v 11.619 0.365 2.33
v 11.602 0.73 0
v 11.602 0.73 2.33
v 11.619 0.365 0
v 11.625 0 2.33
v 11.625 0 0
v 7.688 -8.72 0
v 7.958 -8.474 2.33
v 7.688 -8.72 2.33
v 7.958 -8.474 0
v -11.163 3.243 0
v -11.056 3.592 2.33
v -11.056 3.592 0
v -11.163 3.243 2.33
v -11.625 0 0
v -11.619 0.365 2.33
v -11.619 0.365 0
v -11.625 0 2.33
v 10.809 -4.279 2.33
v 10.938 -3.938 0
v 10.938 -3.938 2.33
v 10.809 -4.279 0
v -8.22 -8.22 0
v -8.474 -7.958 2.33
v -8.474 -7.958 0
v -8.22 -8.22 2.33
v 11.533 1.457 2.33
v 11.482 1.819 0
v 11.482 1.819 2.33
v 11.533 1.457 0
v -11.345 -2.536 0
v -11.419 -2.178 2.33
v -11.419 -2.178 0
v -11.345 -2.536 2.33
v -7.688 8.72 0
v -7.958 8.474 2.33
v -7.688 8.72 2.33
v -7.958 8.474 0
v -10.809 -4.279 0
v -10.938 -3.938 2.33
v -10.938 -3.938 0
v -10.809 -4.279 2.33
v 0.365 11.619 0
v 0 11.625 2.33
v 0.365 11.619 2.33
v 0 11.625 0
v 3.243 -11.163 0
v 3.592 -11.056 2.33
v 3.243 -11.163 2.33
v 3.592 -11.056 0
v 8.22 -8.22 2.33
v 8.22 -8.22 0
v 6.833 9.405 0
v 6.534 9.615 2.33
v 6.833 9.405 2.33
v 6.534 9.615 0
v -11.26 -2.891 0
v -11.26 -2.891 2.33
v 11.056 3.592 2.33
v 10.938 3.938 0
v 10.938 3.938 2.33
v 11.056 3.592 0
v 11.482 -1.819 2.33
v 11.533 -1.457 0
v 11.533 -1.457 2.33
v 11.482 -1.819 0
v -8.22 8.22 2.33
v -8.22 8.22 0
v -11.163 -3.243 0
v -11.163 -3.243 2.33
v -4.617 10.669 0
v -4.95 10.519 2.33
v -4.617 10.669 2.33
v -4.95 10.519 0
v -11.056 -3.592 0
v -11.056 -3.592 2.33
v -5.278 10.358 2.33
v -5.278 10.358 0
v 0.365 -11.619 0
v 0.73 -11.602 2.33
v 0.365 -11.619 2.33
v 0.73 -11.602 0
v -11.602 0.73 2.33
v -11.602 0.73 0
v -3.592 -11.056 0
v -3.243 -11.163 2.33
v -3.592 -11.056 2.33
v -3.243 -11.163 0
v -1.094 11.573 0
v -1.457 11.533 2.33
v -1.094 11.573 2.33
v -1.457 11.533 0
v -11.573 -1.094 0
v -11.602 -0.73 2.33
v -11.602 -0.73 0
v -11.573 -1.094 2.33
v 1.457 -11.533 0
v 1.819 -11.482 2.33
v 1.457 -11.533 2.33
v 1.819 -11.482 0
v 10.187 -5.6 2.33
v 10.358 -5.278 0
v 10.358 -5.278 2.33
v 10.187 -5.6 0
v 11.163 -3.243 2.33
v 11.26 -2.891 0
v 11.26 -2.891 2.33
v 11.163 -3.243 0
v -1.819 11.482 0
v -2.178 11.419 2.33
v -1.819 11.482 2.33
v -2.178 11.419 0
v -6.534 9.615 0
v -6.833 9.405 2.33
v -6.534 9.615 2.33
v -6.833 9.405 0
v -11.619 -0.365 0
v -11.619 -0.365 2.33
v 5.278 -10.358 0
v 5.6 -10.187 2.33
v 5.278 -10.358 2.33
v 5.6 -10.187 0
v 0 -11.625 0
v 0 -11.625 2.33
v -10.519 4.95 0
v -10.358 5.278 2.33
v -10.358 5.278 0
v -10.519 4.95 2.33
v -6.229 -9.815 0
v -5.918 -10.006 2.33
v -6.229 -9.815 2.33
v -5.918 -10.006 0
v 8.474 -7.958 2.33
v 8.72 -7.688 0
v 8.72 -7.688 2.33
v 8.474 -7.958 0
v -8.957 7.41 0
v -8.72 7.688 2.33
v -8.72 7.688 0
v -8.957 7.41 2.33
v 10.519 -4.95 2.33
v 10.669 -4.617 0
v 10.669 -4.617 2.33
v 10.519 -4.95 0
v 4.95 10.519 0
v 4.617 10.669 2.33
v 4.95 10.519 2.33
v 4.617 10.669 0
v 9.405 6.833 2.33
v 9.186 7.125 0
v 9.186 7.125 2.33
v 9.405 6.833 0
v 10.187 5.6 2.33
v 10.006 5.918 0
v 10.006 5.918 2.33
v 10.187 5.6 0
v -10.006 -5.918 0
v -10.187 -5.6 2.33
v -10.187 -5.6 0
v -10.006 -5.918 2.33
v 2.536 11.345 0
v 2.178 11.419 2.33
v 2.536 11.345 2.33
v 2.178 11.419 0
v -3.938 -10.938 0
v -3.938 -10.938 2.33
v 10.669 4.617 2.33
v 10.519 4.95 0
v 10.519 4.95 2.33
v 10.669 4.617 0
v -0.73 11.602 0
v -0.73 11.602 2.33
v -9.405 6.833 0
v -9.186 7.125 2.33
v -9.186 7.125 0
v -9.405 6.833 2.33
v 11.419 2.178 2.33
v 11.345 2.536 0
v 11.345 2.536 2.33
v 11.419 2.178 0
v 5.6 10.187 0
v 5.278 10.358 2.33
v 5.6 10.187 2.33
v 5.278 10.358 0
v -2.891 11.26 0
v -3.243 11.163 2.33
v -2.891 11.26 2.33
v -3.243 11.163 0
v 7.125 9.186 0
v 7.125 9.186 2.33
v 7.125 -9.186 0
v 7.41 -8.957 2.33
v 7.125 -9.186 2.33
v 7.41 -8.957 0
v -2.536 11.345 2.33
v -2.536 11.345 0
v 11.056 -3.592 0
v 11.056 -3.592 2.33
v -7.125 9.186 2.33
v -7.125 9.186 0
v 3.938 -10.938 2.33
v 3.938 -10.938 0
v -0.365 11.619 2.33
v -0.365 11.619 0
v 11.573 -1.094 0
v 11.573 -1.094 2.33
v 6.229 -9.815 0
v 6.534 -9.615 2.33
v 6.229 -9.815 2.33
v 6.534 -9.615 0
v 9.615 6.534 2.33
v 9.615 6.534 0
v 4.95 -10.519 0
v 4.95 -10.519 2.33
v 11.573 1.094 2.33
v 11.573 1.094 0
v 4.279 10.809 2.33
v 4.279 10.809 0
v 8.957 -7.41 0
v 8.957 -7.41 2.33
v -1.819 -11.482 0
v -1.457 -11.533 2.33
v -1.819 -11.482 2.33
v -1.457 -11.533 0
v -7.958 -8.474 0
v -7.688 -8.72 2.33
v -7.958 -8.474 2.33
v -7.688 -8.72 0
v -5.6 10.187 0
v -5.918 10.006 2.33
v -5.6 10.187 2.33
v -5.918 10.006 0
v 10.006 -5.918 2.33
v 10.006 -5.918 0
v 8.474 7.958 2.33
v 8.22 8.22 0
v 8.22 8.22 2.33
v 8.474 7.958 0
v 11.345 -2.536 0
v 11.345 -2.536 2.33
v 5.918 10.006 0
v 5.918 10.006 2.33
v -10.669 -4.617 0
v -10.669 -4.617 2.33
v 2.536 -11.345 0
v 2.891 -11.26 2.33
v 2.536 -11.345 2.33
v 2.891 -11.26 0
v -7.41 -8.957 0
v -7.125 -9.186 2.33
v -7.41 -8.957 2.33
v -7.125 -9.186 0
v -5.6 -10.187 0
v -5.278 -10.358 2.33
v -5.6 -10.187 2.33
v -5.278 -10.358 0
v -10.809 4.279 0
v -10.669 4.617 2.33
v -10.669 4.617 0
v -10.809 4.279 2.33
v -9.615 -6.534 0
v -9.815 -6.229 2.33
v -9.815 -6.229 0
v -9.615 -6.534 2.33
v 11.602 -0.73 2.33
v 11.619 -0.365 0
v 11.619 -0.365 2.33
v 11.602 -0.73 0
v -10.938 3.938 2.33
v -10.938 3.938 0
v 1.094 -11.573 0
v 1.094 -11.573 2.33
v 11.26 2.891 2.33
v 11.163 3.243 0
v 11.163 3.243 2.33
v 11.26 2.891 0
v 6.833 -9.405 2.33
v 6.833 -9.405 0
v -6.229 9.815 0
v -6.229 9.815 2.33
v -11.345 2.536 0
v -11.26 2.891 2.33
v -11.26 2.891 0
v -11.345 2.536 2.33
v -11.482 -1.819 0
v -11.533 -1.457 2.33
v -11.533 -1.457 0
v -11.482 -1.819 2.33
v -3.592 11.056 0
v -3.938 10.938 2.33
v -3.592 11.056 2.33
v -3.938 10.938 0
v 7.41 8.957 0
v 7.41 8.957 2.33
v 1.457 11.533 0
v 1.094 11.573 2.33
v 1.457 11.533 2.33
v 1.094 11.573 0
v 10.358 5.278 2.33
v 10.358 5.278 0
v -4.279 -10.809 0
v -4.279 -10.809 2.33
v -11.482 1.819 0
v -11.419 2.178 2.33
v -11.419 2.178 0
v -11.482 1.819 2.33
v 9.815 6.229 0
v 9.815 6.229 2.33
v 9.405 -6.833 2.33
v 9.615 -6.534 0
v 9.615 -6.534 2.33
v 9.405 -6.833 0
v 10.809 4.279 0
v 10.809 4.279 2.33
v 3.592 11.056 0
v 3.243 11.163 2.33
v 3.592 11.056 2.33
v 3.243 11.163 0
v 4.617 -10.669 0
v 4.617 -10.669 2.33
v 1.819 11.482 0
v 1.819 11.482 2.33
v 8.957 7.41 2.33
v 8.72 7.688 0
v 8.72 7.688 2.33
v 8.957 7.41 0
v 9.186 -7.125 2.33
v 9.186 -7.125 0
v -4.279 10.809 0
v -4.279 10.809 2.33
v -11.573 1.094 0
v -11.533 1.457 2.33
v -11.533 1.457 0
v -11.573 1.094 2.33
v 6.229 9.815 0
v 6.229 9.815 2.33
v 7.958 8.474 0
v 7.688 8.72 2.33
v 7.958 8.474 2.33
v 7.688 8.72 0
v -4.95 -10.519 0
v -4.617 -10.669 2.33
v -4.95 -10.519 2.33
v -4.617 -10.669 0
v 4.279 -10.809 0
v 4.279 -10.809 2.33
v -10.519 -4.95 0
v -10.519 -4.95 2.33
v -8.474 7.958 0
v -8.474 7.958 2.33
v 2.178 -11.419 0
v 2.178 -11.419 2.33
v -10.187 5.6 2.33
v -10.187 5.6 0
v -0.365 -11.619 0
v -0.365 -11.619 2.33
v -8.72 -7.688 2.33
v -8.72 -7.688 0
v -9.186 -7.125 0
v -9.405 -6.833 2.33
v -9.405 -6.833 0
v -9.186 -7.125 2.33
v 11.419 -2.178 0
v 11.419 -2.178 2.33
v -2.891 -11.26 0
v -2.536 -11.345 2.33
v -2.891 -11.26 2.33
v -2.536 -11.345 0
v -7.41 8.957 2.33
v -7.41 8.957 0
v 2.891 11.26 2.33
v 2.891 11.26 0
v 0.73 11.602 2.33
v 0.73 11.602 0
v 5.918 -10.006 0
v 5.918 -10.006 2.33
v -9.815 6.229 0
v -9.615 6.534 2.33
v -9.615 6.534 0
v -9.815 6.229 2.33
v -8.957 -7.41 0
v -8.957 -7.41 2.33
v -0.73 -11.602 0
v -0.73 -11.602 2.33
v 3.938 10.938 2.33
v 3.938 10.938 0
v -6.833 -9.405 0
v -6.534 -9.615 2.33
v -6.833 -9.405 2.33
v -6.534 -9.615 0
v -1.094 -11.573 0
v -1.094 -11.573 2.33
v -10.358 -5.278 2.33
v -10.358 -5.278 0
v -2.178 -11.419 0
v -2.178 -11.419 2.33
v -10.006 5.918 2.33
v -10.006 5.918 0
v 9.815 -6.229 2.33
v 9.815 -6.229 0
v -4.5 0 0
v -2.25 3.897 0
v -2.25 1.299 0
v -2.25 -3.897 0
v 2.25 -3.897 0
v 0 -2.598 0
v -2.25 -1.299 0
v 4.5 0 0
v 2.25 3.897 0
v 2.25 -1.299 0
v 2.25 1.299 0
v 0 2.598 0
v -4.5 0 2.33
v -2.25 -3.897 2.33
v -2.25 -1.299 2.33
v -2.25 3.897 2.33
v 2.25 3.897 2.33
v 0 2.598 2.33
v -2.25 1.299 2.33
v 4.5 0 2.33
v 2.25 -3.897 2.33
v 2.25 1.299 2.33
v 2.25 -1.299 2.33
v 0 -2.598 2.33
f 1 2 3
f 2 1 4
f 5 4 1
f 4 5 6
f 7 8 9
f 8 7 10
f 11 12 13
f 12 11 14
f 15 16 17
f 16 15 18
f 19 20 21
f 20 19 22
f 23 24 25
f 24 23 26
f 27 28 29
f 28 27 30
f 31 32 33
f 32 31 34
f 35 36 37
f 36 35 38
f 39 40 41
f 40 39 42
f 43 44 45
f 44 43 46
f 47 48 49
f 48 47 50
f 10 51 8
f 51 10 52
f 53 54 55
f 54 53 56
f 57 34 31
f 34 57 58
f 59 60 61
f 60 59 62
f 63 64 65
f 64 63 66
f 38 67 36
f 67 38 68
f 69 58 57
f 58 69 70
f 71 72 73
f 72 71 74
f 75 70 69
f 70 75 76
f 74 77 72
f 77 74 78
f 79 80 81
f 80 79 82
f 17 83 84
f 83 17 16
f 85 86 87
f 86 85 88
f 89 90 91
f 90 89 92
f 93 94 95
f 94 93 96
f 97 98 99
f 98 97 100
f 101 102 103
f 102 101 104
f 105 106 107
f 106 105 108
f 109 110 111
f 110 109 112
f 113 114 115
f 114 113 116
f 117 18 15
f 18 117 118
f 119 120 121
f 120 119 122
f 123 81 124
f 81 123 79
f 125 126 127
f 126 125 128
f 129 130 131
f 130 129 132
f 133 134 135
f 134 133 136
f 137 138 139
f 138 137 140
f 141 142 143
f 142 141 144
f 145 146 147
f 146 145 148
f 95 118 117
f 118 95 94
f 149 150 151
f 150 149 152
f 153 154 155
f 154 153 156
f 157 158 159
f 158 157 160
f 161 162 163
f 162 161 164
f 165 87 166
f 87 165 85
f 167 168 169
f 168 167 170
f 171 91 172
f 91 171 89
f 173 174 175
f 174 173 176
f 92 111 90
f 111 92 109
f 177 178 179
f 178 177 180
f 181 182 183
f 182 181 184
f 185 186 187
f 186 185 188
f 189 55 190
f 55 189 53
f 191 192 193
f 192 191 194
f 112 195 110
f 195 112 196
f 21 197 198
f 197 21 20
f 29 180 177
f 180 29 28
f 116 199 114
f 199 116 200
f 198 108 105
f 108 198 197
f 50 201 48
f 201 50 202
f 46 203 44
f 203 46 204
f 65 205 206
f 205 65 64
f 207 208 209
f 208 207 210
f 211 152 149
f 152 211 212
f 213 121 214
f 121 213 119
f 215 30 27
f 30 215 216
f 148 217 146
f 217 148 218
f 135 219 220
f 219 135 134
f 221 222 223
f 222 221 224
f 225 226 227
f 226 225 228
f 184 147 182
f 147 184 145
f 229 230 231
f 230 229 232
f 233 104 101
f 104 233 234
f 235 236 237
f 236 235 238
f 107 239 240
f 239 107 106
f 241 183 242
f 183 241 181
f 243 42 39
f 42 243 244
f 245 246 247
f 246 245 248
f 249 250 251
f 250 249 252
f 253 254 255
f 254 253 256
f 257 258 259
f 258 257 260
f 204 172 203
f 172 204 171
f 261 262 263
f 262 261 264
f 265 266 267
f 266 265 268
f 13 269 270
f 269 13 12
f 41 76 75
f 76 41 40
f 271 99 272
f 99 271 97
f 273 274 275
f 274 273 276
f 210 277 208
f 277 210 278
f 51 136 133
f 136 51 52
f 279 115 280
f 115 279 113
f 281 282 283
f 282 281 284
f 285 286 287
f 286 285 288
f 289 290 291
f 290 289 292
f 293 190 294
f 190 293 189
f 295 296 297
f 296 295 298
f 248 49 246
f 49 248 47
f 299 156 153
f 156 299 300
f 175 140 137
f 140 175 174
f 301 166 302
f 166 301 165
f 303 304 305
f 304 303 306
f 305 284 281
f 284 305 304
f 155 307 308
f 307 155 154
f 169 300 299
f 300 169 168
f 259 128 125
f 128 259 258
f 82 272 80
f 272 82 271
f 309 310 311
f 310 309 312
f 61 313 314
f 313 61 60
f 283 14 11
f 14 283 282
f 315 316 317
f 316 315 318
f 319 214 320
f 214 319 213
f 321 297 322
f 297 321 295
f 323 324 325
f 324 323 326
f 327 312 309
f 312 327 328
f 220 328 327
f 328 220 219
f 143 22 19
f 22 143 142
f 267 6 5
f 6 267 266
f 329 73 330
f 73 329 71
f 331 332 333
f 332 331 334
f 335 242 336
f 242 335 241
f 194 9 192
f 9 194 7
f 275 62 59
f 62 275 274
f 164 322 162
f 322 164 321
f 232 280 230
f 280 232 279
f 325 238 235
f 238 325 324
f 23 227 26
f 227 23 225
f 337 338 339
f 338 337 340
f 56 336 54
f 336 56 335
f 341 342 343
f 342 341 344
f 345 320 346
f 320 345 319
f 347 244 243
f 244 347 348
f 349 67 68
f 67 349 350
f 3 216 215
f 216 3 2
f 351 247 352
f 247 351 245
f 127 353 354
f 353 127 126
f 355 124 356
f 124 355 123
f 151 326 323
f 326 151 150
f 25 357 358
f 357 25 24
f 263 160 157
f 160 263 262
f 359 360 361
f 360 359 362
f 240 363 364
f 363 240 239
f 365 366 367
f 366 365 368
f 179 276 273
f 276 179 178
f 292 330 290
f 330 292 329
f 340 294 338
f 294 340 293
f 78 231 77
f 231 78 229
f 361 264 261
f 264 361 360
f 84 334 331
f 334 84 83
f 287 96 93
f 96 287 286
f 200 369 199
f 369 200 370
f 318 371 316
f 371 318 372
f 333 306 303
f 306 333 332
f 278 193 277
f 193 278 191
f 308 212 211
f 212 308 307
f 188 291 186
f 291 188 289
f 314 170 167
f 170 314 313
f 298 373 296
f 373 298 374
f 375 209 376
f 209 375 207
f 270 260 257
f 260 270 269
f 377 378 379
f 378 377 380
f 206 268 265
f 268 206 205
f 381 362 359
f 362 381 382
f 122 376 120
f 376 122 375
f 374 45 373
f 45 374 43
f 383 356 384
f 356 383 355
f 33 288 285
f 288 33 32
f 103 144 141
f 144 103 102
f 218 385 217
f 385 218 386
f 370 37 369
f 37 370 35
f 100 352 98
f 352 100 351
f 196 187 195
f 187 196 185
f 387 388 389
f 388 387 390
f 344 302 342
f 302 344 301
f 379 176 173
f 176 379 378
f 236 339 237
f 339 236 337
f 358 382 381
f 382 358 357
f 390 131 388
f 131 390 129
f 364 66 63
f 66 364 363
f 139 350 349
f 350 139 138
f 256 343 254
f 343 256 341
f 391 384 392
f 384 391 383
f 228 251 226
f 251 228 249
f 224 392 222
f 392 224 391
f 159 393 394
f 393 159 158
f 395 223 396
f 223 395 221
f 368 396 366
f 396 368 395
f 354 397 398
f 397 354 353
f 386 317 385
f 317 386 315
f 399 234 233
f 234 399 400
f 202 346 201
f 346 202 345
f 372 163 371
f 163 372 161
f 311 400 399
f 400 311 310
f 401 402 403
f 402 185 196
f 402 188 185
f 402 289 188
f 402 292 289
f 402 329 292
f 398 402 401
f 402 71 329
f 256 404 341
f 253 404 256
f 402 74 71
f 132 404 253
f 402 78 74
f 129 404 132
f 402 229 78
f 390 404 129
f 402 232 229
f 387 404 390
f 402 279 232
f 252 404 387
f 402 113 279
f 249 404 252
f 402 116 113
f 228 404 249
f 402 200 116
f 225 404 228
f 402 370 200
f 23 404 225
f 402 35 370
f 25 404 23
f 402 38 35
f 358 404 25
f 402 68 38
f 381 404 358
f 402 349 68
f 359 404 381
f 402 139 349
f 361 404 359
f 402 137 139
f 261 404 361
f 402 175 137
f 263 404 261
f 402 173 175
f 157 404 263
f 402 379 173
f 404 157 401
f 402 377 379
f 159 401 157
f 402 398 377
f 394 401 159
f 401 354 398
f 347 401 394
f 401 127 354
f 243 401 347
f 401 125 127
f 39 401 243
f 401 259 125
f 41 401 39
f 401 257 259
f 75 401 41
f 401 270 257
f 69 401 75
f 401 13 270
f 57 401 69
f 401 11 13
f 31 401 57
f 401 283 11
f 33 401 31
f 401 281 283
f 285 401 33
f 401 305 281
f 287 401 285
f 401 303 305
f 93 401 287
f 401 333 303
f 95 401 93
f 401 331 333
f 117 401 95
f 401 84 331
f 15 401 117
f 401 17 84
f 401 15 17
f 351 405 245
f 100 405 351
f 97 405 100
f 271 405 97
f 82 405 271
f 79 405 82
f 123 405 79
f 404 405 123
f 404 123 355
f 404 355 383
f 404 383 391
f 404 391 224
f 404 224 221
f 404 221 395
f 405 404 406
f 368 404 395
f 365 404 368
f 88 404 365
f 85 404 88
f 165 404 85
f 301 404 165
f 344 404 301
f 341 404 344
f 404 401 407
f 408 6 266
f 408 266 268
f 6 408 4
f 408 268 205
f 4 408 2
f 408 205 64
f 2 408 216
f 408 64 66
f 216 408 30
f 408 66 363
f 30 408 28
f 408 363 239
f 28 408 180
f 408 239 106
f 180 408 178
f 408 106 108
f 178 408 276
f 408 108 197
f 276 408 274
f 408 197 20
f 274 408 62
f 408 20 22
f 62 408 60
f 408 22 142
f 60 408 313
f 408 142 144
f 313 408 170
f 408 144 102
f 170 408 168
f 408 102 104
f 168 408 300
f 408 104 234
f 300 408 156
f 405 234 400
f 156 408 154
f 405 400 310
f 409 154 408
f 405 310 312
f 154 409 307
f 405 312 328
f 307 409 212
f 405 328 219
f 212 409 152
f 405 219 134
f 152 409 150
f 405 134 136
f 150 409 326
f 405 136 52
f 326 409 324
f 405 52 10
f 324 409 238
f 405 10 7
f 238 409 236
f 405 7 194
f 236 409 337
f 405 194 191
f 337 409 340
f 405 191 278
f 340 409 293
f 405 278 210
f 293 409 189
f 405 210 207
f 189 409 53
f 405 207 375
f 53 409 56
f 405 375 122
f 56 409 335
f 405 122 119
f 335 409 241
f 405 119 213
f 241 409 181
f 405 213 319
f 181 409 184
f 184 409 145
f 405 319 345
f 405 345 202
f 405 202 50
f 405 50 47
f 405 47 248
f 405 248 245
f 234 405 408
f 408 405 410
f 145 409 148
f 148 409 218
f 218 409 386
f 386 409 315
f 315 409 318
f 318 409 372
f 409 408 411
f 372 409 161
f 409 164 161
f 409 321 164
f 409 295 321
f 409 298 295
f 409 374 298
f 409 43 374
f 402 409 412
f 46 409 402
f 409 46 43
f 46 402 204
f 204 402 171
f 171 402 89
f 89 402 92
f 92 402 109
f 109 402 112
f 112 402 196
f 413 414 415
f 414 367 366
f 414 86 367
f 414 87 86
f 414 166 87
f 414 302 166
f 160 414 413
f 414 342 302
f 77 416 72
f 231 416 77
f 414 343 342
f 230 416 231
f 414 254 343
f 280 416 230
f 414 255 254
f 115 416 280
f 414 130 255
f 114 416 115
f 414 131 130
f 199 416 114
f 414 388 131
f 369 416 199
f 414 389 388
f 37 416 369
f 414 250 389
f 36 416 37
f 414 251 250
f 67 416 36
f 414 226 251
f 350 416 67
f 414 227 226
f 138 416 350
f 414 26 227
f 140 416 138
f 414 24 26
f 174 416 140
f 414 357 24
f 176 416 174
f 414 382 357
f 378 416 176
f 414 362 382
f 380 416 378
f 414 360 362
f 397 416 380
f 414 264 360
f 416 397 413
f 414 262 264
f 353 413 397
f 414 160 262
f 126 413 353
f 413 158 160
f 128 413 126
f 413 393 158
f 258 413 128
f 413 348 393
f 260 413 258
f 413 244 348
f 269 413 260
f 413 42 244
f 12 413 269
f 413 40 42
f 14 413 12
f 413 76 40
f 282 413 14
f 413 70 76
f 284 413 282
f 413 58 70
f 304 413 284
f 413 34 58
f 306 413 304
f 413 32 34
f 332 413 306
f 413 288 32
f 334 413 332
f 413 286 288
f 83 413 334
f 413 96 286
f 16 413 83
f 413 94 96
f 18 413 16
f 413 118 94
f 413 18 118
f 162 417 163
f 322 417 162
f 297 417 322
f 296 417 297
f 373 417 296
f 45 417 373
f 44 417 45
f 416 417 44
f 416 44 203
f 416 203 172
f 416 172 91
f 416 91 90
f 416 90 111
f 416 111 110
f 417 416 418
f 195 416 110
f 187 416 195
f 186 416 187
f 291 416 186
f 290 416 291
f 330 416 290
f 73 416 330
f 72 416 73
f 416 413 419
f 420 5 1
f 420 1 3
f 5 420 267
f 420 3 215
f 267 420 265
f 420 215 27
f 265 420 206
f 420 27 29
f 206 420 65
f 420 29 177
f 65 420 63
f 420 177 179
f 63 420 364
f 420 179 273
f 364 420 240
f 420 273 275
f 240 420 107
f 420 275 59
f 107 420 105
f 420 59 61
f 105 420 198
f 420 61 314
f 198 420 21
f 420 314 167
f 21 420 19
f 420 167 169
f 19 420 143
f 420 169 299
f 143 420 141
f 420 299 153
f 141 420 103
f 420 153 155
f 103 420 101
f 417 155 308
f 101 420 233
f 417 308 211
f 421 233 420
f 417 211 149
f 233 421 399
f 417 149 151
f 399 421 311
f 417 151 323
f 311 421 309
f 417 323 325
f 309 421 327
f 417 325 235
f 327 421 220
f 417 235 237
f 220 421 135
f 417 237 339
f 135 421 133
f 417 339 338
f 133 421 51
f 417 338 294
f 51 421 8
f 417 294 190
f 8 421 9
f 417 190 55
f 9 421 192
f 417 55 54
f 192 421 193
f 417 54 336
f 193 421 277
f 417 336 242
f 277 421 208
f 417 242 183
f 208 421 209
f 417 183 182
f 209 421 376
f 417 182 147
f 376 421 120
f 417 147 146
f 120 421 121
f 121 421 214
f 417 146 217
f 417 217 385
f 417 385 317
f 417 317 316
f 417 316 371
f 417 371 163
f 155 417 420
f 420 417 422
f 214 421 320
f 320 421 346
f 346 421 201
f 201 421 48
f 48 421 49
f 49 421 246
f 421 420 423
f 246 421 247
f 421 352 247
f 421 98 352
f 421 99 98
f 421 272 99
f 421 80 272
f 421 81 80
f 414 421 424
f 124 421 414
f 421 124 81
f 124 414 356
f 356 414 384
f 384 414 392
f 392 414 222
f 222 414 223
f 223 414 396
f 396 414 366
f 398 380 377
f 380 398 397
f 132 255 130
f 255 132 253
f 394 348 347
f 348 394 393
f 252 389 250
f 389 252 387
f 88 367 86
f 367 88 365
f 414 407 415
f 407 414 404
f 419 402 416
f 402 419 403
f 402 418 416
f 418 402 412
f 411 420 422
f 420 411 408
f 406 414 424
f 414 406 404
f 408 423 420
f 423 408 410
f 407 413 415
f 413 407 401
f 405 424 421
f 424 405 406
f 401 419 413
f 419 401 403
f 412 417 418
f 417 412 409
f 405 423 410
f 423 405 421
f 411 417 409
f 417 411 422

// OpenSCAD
$fn=200;

difference()
{
    cylinder(d=23.25, h=2.33);
    translate([0,0,-3])
    {
        cylinder(d=9,h=10,$fn=3);
    }
    translate([0,0,-3])
    {
        rotate([0,0,180])
        {
            cylinder(d=9,h=10,$fn=3);
        }
    }
}
